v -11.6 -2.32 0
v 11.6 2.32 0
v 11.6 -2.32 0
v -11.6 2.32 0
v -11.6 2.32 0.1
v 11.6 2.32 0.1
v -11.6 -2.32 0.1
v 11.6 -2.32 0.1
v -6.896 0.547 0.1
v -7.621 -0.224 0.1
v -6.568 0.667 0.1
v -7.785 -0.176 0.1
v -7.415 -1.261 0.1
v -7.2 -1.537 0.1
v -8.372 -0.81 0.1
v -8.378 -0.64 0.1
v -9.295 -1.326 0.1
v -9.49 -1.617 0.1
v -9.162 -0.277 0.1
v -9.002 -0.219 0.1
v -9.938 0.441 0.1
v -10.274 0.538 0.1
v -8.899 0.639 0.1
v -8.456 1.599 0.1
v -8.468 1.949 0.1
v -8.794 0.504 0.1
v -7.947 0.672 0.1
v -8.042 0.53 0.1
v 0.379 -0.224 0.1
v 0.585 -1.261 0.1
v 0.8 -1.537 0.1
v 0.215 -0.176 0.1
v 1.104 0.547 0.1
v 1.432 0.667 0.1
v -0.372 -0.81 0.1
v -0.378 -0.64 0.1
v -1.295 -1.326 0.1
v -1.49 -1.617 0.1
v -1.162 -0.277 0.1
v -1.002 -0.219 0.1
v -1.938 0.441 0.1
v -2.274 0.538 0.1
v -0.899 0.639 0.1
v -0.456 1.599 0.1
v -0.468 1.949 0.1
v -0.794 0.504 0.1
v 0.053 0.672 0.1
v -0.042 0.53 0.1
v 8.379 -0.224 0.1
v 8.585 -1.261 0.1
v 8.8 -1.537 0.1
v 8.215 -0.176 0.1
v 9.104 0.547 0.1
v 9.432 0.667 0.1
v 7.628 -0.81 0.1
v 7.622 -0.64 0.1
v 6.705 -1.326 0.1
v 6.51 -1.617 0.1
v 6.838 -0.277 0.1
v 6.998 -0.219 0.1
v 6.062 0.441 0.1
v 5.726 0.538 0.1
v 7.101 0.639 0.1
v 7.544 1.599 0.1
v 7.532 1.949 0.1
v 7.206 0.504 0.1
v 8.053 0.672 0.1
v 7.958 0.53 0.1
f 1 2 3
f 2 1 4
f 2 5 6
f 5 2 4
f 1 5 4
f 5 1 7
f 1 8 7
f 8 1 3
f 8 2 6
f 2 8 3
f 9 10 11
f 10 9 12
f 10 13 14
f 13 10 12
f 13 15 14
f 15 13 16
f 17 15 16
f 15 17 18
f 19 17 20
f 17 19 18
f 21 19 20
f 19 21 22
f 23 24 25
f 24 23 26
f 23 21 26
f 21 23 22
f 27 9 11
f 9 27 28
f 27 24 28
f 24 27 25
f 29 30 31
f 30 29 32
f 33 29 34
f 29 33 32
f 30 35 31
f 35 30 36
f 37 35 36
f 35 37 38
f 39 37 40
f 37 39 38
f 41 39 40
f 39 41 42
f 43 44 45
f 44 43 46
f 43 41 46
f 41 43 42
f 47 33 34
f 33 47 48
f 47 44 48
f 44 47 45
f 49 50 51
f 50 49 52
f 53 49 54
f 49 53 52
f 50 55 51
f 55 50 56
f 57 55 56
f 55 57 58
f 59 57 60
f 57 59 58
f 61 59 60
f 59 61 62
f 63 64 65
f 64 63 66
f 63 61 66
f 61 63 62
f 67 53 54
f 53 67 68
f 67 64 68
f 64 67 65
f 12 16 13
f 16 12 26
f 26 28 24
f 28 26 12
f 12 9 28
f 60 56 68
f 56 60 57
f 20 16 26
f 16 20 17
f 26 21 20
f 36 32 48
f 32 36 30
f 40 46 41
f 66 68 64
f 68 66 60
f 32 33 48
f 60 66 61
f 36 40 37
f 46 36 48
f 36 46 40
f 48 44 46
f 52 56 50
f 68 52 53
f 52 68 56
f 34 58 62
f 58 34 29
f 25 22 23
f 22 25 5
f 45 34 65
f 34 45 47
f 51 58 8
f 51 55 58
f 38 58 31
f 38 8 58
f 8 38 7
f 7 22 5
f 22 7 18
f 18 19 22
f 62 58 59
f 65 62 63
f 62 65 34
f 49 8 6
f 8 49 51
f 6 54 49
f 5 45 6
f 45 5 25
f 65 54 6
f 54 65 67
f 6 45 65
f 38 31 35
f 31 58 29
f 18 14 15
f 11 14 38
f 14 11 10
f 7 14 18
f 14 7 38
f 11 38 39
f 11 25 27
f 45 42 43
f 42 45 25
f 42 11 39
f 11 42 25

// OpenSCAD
// file: ../p/box5-12.scad
use <../lib.scad>
function ldraw_lib__box5_12() = [
// 0 Box with 5 Faces without Any Edges
// 0 Name: box5-12.dat
// 0 Author: Chris Dee [cwdee]
// 0 !LDRAW_ORG Primitive UPDATE 2009-02
// 0 !LICENSE Licensed under CC BY 2.0 and CC BY 4.0 : see CAreadme.txt
// 
// 0 BFC CERTIFY CCW
  [0,"BFC","CERTIFY"],
  [0,"BFC","CCW"],
// 
// 0 !HISTORY 2009-09-03 [PTadmin] Official Update 2009-02
// 
// 
// 4 16 1 1 1 1 1 -1 -1 1 -1 -1 1 1
  [4,16,1,1,1,1,1,-1,-1,1,-1,-1,1,1],
// 4 16 -1 0 1 1 0 1 1 1 1 -1 1 1
  [4,16,-1,0,1,1,0,1,1,1,1,-1,1,1],
// 4 16 -1 0 -1 -1 0 1 -1 1 1 -1 1 -1
  [4,16,-1,0,-1,-1,0,1,-1,1,1,-1,1,-1],
// 4 16 1 0 -1 -1 0 -1 -1 1 -1 1 1 -1
  [4,16,1,0,-1,-1,0,-1,-1,1,-1,1,1,-1],
// 4 16 1 0 1 1 0 -1 1 1 -1 1 1 1
  [4,16,1,0,1,1,0,-1,1,1,-1,1,1,1],
// 0
];
makepoly(ldraw_lib__box5_12(), line=0.2);
// main file
use <../lib.scad>
use <../p/box5-12.scad>
function ldraw_lib__168335s() = [
// 0 Sticker  0.6 x  2.9 with  3 White Stars with Black Outline
// 0 Name: 168335s.dat
// 0 Author: Ulrich Röder [UR]
// 0 !LDRAW_ORG Part UPDATE 2018-02
// 0 !LICENSE Licensed under CC BY 2.0 and CC BY 4.0 : see CAreadme.txt
// 
// 0 BFC CERTIFY CCW
  [0,"BFC","CERTIFY"],
  [0,"BFC","CCW"],
// 
// 0 !KEYWORDS Set 5591
// 
// 0 !HISTORY 2018-12-08 [PTadmin] Official Update 2018-02
// 
// 
// 0 // Main
// 1 16 0 -0.25 0 29 0 0 0 0.25 0 0 0 5.8 box5-12.dat
  [1,16,0,-0.25,0,29,0,0,0,0.25,0,0,0,5.8, ldraw_lib__box5_12()],
// 
// 0 // Black
// 4 0 -19.462 -.25 -.441 -19.052 -.25 -.559 -16.419 -.25 1.667 -17.241 -.25 1.368
  [4,0,-19.462,-.25,-.441,-19.052,-.25,-.559,-16.419,-.25,1.667,-17.241,-.25,1.368],
// 4 0 -17.999 -.25 -3.842 -19.052 -.25 -.559 -19.462 -.25 -.441 -18.537 -.25 -3.152
  [4,0,-17.999,-.25,-3.842,-19.052,-.25,-.559,-19.462,-.25,-.441,-18.537,-.25,-3.152],
// 4 0 -17.999 -.25 -3.842 -18.537 -.25 -3.152 -20.944 -.25 -1.599 -20.929 -.25 -2.025
  [4,0,-17.999,-.25,-3.842,-18.537,-.25,-3.152,-20.944,-.25,-1.599,-20.929,-.25,-2.025],
// 4 0 -23.726 -.25 -4.042 -20.929 -.25 -2.025 -20.944 -.25 -1.599 -23.237 -.25 -3.316
  [4,0,-23.726,-.25,-4.042,-20.929,-.25,-2.025,-20.944,-.25,-1.599,-23.237,-.25,-3.316],
// 4 0 -23.726 -.25 -4.042 -23.237 -.25 -3.316 -22.504 -.25 -.547 -22.904 -.25 -.693
  [4,0,-23.726,-.25,-4.042,-23.237,-.25,-3.316,-22.504,-.25,-.547,-22.904,-.25,-.693],
// 4 0 -25.686 -.25 1.344 -22.904 -.25 -.693 -22.504 -.25 -.547 -24.845 -.25 1.103
  [4,0,-25.686,-.25,1.344,-22.904,-.25,-.693,-22.504,-.25,-.547,-24.845,-.25,1.103],
// 4 0 -21.17 -.25 4.872 -22.248 -.25 1.597 -21.985 -.25 1.261 -21.14 -.25 3.998
  [4,0,-21.17,-.25,4.872,-22.248,-.25,1.597,-21.985,-.25,1.261,-21.14,-.25,3.998],
// 4 0 -25.686 -.25 1.344 -24.845 -.25 1.103 -21.985 -.25 1.261 -22.248 -.25 1.597
  [4,0,-25.686,-.25,1.344,-24.845,-.25,1.103,-21.985,-.25,1.261,-22.248,-.25,1.597],
// 4 0 -16.419 -.25 1.667 -19.867 -.25 1.68 -20.105 -.25 1.326 -17.241 -.25 1.368
  [4,0,-16.419,-.25,1.667,-19.867,-.25,1.68,-20.105,-.25,1.326,-17.241,-.25,1.368],
// 4 0 -21.17 -.25 4.872 -21.14 -.25 3.998 -20.105 -.25 1.326 -19.867 -.25 1.68
  [4,0,-21.17,-.25,4.872,-21.14,-.25,3.998,-20.105,-.25,1.326,-19.867,-.25,1.68],
// 4 0 2.001 -.25 -3.842 .948 -.25 -.559 .538 -.25 -.441 1.463 -.25 -3.152
  [4,0,2.001,-.25,-3.842,.948,-.25,-.559,.538,-.25,-.441,1.463,-.25,-3.152],
// 4 0 3.581 -.25 1.667 2.759 -.25 1.368 .538 -.25 -.441 .948 -.25 -.559
  [4,0,3.581,-.25,1.667,2.759,-.25,1.368,.538,-.25,-.441,.948,-.25,-.559],
// 4 0 2.001 -.25 -3.842 1.463 -.25 -3.152 -.944 -.25 -1.599 -.929 -.25 -2.025
  [4,0,2.001,-.25,-3.842,1.463,-.25,-3.152,-.944,-.25,-1.599,-.929,-.25,-2.025],
// 4 0 -3.726 -.25 -4.042 -.929 -.25 -2.025 -.944 -.25 -1.599 -3.237 -.25 -3.316
  [4,0,-3.726,-.25,-4.042,-.929,-.25,-2.025,-.944,-.25,-1.599,-3.237,-.25,-3.316],
// 4 0 -3.726 -.25 -4.042 -3.237 -.25 -3.316 -2.504 -.25 -.547 -2.904 -.25 -.693
  [4,0,-3.726,-.25,-4.042,-3.237,-.25,-3.316,-2.504,-.25,-.547,-2.904,-.25,-.693],
// 4 0 -5.686 -.25 1.344 -2.904 -.25 -.693 -2.504 -.25 -.547 -4.845 -.25 1.103
  [4,0,-5.686,-.25,1.344,-2.904,-.25,-.693,-2.504,-.25,-.547,-4.845,-.25,1.103],
// 4 0 -1.17 -.25 4.872 -2.248 -.25 1.597 -1.985 -.25 1.261 -1.14 -.25 3.998
  [4,0,-1.17,-.25,4.872,-2.248,-.25,1.597,-1.985,-.25,1.261,-1.14,-.25,3.998],
// 4 0 -5.686 -.25 1.344 -4.845 -.25 1.103 -1.985 -.25 1.261 -2.248 -.25 1.597
  [4,0,-5.686,-.25,1.344,-4.845,-.25,1.103,-1.985,-.25,1.261,-2.248,-.25,1.597],
// 4 0 3.581 -.25 1.667 .133 -.25 1.68 -.105 -.25 1.326 2.759 -.25 1.368
  [4,0,3.581,-.25,1.667,.133,-.25,1.68,-.105,-.25,1.326,2.759,-.25,1.368],
// 4 0 -1.17 -.25 4.872 -1.14 -.25 3.998 -.105 -.25 1.326 .133 -.25 1.68
  [4,0,-1.17,-.25,4.872,-1.14,-.25,3.998,-.105,-.25,1.326,.133,-.25,1.68],
// 4 0 22.001 -.25 -3.842 20.948 -.25 -.559 20.538 -.25 -.441 21.463 -.25 -3.152
  [4,0,22.001,-.25,-3.842,20.948,-.25,-.559,20.538,-.25,-.441,21.463,-.25,-3.152],
// 4 0 23.581 -.25 1.667 22.759 -.25 1.368 20.538 -.25 -.441 20.948 -.25 -.559
  [4,0,23.581,-.25,1.667,22.759,-.25,1.368,20.538,-.25,-.441,20.948,-.25,-.559],
// 4 0 22.001 -.25 -3.842 21.463 -.25 -3.152 19.056 -.25 -1.599 19.071 -.25 -2.025
  [4,0,22.001,-.25,-3.842,21.463,-.25,-3.152,19.056,-.25,-1.599,19.071,-.25,-2.025],
// 4 0 16.274 -.25 -4.042 19.071 -.25 -2.025 19.056 -.25 -1.599 16.763 -.25 -3.316
  [4,0,16.274,-.25,-4.042,19.071,-.25,-2.025,19.056,-.25,-1.599,16.763,-.25,-3.316],
// 4 0 16.274 -.25 -4.042 16.763 -.25 -3.316 17.496 -.25 -.547 17.096 -.25 -.693
  [4,0,16.274,-.25,-4.042,16.763,-.25,-3.316,17.496,-.25,-.547,17.096,-.25,-.693],
// 4 0 17.496 -.25 -.547 15.155 -.25 1.103 14.314 -.25 1.344 17.096 -.25 -.693
  [4,0,17.496,-.25,-.547,15.155,-.25,1.103,14.314,-.25,1.344,17.096,-.25,-.693],
// 4 0 18.83 -.25 4.872 17.752 -.25 1.597 18.015 -.25 1.261 18.86 -.25 3.998
  [4,0,18.83,-.25,4.872,17.752,-.25,1.597,18.015,-.25,1.261,18.86,-.25,3.998],
// 4 0 14.314 -.25 1.344 15.155 -.25 1.103 18.015 -.25 1.261 17.752 -.25 1.597
  [4,0,14.314,-.25,1.344,15.155,-.25,1.103,18.015,-.25,1.261,17.752,-.25,1.597],
// 4 0 23.581 -.25 1.667 20.133 -.25 1.68 19.895 -.25 1.326 22.759 -.25 1.368
  [4,0,23.581,-.25,1.667,20.133,-.25,1.68,19.895,-.25,1.326,22.759,-.25,1.368],
// 4 0 18.83 -.25 4.872 18.86 -.25 3.998 19.895 -.25 1.326 20.133 -.25 1.68
  [4,0,18.83,-.25,4.872,18.86,-.25,3.998,19.895,-.25,1.326,20.133,-.25,1.68],
// 
// 0 // White
// 4 15 -18.537 -.25 -3.152 -19.462 -.25 -.441 -21.985 -.25 1.261 -20.944 -.25 -1.599
  [4,15,-18.537,-.25,-3.152,-19.462,-.25,-.441,-21.985,-.25,1.261,-20.944,-.25,-1.599],
// 4 15 -19.462 -.25 -.441 -20.105 -.25 1.326 -21.14 -.25 3.998 -21.985 -.25 1.261
  [4,15,-19.462,-.25,-.441,-20.105,-.25,1.326,-21.14,-.25,3.998,-21.985,-.25,1.261],
// 3 15 -19.462 -0.25 -0.441 -17.241 -0.25 1.368 -20.105 -0.25 1.326
  [3,15,-19.462,-0.25,-0.441,-17.241,-0.25,1.368,-20.105,-0.25,1.326],
// 4 15 19.895 -.25 1.326 17.496 -.25 -.547 16.763 -.25 -3.316 19.056 -.25 -1.599
  [4,15,19.895,-.25,1.326,17.496,-.25,-.547,16.763,-.25,-3.316,19.056,-.25,-1.599],
// 4 15 -21.985 -.25 1.261 -22.504 -.25 -.547 -23.237 -.25 -3.316 -20.944 -.25 -1.599
  [4,15,-21.985,-.25,1.261,-22.504,-.25,-.547,-23.237,-.25,-3.316,-20.944,-.25,-1.599],
// 3 15 -21.985 -0.25 1.261 -24.845 -0.25 1.103 -22.504 -0.25 -0.547
  [3,15,-21.985,-0.25,1.261,-24.845,-0.25,1.103,-22.504,-0.25,-0.547],
// 4 15 -.105 -.25 1.326 -.944 -.25 -1.599 1.463 -.25 -3.152 .538 -.25 -.441
  [4,15,-.105,-.25,1.326,-.944,-.25,-1.599,1.463,-.25,-3.152,.538,-.25,-.441],
// 3 15 -2.504 -0.25 -0.547 -1.985 -0.25 1.261 -4.845 -0.25 1.103
  [3,15,-2.504,-0.25,-0.547,-1.985,-0.25,1.261,-4.845,-0.25,1.103],
// 4 15 17.496 -.25 -.547 19.895 -.25 1.326 18.86 -.25 3.998 18.015 -.25 1.261
  [4,15,17.496,-.25,-.547,19.895,-.25,1.326,18.86,-.25,3.998,18.015,-.25,1.261],
// 3 15 0.538 -0.25 -0.441 2.759 -0.25 1.368 -0.105 -0.25 1.326
  [3,15,0.538,-0.25,-0.441,2.759,-0.25,1.368,-0.105,-0.25,1.326],
// 3 15 17.496 -0.25 -0.547 18.015 -0.25 1.261 15.155 -0.25 1.103
  [3,15,17.496,-0.25,-0.547,18.015,-0.25,1.261,15.155,-0.25,1.103],
// 3 15 -0.944 -0.25 -1.599 -2.504 -0.25 -0.547 -3.237 -0.25 -3.316
  [3,15,-0.944,-0.25,-1.599,-2.504,-0.25,-0.547,-3.237,-0.25,-3.316],
// 4 15 -.944 -.25 -1.599 -.105 -.25 1.326 -1.985 -.25 1.261 -2.504 -.25 -.547
  [4,15,-.944,-.25,-1.599,-.105,-.25,1.326,-1.985,-.25,1.261,-2.504,-.25,-.547],
// 3 15 -0.105 -0.25 1.326 -1.14 -0.25 3.998 -1.985 -0.25 1.261
  [3,15,-0.105,-0.25,1.326,-1.14,-0.25,3.998,-1.985,-0.25,1.261],
// 3 15 20.538 -0.25 -0.441 19.056 -0.25 -1.599 21.463 -0.25 -3.152
  [3,15,20.538,-0.25,-0.441,19.056,-0.25,-1.599,21.463,-0.25,-3.152],
// 4 15 22.759 -.25 1.368 19.895 -.25 1.326 19.056 -.25 -1.599 20.538 -.25 -.441
  [4,15,22.759,-.25,1.368,19.895,-.25,1.326,19.056,-.25,-1.599,20.538,-.25,-.441],
// 
// 0 // Red
// 4 4 14.314 -.25 1.344 3.581 -.25 1.667 .948 -.25 -.559 16.274 -.25 -4.042
  [4,4,14.314,-.25,1.344,3.581,-.25,1.667,.948,-.25,-.559,16.274,-.25,-4.042],
// 4 4 -22.248 -.25 1.597 -21.17 -.25 4.872 -29 -.25 5.8 -25.686 -.25 1.344
  [4,4,-22.248,-.25,1.597,-21.17,-.25,4.872,-29,-.25,5.8,-25.686,-.25,1.344],
// 4 4 3.581 -.25 1.667 18.83 -.25 4.872 -1.17 -.25 4.872 .133 -.25 1.68
  [4,4,3.581,-.25,1.667,18.83,-.25,4.872,-1.17,-.25,4.872,.133,-.25,1.68],
// 3 4 22.001 -0.25 -3.842 16.274 -0.25 -4.042 29 -0.25 -5.8
  [3,4,22.001,-0.25,-3.842,16.274,-0.25,-4.042,29,-0.25,-5.8],
// 3 4 22.001 -0.25 -3.842 19.071 -0.25 -2.025 16.274 -0.25 -4.042
  [3,4,22.001,-0.25,-3.842,19.071,-0.25,-2.025,16.274,-0.25,-4.042],
// 3 4 -3.726 -0.25 -4.042 16.274 -0.25 -4.042 2.001 -0.25 -3.842
  [3,4,-3.726,-0.25,-4.042,16.274,-0.25,-4.042,2.001,-0.25,-3.842],
// 4 4 29 -.25 -5.8 16.274 -.25 -4.042 -3.726 -.25 -4.042 -29 -.25 -5.8
  [4,4,29,-.25,-5.8,16.274,-.25,-4.042,-3.726,-.25,-4.042,-29,-.25,-5.8],
// 4 4 -29 -.25 5.8 -29 -.25 -5.8 -23.726 -.25 -4.042 -25.686 -.25 1.344
  [4,4,-29,-.25,5.8,-29,-.25,-5.8,-23.726,-.25,-4.042,-25.686,-.25,1.344],
// 3 4 -23.726 -0.25 -4.042 -22.904 -0.25 -0.693 -25.686 -0.25 1.344
  [3,4,-23.726,-0.25,-4.042,-22.904,-0.25,-0.693,-25.686,-0.25,1.344],
// 3 4 14.314 -0.25 1.344 16.274 -0.25 -4.042 17.096 -0.25 -0.693
  [3,4,14.314,-0.25,1.344,16.274,-0.25,-4.042,17.096,-0.25,-0.693],
// 4 4 17.752 -.25 1.597 18.83 -.25 4.872 3.581 -.25 1.667 14.314 -.25 1.344
  [4,4,17.752,-.25,1.597,18.83,-.25,4.872,3.581,-.25,1.667,14.314,-.25,1.344],
// 4 4 22.001 -.25 -3.842 29 -.25 -5.8 29 -.25 5.8 20.948 -.25 -.559
  [4,4,22.001,-.25,-3.842,29,-.25,-5.8,29,-.25,5.8,20.948,-.25,-.559],
// 3 4 29 -0.25 5.8 23.581 -0.25 1.667 20.948 -0.25 -0.559
  [3,4,29,-0.25,5.8,23.581,-0.25,1.667,20.948,-0.25,-0.559],
// 4 4 -1.17 -.25 4.872 29 -.25 5.8 -29 -.25 5.8 -21.17 -.25 4.872
  [4,4,-1.17,-.25,4.872,29,-.25,5.8,-29,-.25,5.8,-21.17,-.25,4.872],
// 4 4 29 -.25 5.8 18.83 -.25 4.872 20.133 -.25 1.68 23.581 -.25 1.667
  [4,4,29,-.25,5.8,18.83,-.25,4.872,20.133,-.25,1.68,23.581,-.25,1.667],
// 3 4 29 -0.25 5.8 -1.17 -0.25 4.872 18.83 -0.25 4.872
  [3,4,29,-0.25,5.8,-1.17,-0.25,4.872,18.83,-0.25,4.872],
// 3 4 -3.726 -0.25 -4.042 2.001 -0.25 -3.842 -0.929 -0.25 -2.025
  [3,4,-3.726,-0.25,-4.042,2.001,-0.25,-3.842,-0.929,-0.25,-2.025],
// 3 4 2.001 -0.25 -3.842 16.274 -0.25 -4.042 0.948 -0.25 -0.559
  [3,4,2.001,-0.25,-3.842,16.274,-0.25,-4.042,0.948,-0.25,-0.559],
// 3 4 -23.726 -0.25 -4.042 -17.999 -0.25 -3.842 -20.929 -0.25 -2.025
  [3,4,-23.726,-0.25,-4.042,-17.999,-0.25,-3.842,-20.929,-0.25,-2.025],
// 4 4 -17.999 -.25 -3.842 -3.726 -.25 -4.042 -16.419 -.25 1.667 -19.052 -.25 -.559
  [4,4,-17.999,-.25,-3.842,-3.726,-.25,-4.042,-16.419,-.25,1.667,-19.052,-.25,-.559],
// 4 4 -17.999 -.25 -3.842 -23.726 -.25 -4.042 -29 -.25 -5.8 -3.726 -.25 -4.042
  [4,4,-17.999,-.25,-3.842,-23.726,-.25,-4.042,-29,-.25,-5.8,-3.726,-.25,-4.042],
// 3 4 -16.419 -0.25 1.667 -3.726 -0.25 -4.042 -2.904 -0.25 -0.693
  [3,4,-16.419,-0.25,1.667,-3.726,-0.25,-4.042,-2.904,-0.25,-0.693],
// 3 4 -16.419 -0.25 1.667 -21.17 -0.25 4.872 -19.867 -0.25 1.68
  [3,4,-16.419,-0.25,1.667,-21.17,-0.25,4.872,-19.867,-0.25,1.68],
// 4 4 -2.248 -.25 1.597 -1.17 -.25 4.872 -21.17 -.25 4.872 -5.686 -.25 1.344
  [4,4,-2.248,-.25,1.597,-1.17,-.25,4.872,-21.17,-.25,4.872,-5.686,-.25,1.344],
// 4 4 -2.904 -.25 -.693 -5.686 -.25 1.344 -21.17 -.25 4.872 -16.419 -.25 1.667
  [4,4,-2.904,-.25,-.693,-5.686,-.25,1.344,-21.17,-.25,4.872,-16.419,-.25,1.667],
];
makepoly(ldraw_lib__168335s(), line=0.2);
